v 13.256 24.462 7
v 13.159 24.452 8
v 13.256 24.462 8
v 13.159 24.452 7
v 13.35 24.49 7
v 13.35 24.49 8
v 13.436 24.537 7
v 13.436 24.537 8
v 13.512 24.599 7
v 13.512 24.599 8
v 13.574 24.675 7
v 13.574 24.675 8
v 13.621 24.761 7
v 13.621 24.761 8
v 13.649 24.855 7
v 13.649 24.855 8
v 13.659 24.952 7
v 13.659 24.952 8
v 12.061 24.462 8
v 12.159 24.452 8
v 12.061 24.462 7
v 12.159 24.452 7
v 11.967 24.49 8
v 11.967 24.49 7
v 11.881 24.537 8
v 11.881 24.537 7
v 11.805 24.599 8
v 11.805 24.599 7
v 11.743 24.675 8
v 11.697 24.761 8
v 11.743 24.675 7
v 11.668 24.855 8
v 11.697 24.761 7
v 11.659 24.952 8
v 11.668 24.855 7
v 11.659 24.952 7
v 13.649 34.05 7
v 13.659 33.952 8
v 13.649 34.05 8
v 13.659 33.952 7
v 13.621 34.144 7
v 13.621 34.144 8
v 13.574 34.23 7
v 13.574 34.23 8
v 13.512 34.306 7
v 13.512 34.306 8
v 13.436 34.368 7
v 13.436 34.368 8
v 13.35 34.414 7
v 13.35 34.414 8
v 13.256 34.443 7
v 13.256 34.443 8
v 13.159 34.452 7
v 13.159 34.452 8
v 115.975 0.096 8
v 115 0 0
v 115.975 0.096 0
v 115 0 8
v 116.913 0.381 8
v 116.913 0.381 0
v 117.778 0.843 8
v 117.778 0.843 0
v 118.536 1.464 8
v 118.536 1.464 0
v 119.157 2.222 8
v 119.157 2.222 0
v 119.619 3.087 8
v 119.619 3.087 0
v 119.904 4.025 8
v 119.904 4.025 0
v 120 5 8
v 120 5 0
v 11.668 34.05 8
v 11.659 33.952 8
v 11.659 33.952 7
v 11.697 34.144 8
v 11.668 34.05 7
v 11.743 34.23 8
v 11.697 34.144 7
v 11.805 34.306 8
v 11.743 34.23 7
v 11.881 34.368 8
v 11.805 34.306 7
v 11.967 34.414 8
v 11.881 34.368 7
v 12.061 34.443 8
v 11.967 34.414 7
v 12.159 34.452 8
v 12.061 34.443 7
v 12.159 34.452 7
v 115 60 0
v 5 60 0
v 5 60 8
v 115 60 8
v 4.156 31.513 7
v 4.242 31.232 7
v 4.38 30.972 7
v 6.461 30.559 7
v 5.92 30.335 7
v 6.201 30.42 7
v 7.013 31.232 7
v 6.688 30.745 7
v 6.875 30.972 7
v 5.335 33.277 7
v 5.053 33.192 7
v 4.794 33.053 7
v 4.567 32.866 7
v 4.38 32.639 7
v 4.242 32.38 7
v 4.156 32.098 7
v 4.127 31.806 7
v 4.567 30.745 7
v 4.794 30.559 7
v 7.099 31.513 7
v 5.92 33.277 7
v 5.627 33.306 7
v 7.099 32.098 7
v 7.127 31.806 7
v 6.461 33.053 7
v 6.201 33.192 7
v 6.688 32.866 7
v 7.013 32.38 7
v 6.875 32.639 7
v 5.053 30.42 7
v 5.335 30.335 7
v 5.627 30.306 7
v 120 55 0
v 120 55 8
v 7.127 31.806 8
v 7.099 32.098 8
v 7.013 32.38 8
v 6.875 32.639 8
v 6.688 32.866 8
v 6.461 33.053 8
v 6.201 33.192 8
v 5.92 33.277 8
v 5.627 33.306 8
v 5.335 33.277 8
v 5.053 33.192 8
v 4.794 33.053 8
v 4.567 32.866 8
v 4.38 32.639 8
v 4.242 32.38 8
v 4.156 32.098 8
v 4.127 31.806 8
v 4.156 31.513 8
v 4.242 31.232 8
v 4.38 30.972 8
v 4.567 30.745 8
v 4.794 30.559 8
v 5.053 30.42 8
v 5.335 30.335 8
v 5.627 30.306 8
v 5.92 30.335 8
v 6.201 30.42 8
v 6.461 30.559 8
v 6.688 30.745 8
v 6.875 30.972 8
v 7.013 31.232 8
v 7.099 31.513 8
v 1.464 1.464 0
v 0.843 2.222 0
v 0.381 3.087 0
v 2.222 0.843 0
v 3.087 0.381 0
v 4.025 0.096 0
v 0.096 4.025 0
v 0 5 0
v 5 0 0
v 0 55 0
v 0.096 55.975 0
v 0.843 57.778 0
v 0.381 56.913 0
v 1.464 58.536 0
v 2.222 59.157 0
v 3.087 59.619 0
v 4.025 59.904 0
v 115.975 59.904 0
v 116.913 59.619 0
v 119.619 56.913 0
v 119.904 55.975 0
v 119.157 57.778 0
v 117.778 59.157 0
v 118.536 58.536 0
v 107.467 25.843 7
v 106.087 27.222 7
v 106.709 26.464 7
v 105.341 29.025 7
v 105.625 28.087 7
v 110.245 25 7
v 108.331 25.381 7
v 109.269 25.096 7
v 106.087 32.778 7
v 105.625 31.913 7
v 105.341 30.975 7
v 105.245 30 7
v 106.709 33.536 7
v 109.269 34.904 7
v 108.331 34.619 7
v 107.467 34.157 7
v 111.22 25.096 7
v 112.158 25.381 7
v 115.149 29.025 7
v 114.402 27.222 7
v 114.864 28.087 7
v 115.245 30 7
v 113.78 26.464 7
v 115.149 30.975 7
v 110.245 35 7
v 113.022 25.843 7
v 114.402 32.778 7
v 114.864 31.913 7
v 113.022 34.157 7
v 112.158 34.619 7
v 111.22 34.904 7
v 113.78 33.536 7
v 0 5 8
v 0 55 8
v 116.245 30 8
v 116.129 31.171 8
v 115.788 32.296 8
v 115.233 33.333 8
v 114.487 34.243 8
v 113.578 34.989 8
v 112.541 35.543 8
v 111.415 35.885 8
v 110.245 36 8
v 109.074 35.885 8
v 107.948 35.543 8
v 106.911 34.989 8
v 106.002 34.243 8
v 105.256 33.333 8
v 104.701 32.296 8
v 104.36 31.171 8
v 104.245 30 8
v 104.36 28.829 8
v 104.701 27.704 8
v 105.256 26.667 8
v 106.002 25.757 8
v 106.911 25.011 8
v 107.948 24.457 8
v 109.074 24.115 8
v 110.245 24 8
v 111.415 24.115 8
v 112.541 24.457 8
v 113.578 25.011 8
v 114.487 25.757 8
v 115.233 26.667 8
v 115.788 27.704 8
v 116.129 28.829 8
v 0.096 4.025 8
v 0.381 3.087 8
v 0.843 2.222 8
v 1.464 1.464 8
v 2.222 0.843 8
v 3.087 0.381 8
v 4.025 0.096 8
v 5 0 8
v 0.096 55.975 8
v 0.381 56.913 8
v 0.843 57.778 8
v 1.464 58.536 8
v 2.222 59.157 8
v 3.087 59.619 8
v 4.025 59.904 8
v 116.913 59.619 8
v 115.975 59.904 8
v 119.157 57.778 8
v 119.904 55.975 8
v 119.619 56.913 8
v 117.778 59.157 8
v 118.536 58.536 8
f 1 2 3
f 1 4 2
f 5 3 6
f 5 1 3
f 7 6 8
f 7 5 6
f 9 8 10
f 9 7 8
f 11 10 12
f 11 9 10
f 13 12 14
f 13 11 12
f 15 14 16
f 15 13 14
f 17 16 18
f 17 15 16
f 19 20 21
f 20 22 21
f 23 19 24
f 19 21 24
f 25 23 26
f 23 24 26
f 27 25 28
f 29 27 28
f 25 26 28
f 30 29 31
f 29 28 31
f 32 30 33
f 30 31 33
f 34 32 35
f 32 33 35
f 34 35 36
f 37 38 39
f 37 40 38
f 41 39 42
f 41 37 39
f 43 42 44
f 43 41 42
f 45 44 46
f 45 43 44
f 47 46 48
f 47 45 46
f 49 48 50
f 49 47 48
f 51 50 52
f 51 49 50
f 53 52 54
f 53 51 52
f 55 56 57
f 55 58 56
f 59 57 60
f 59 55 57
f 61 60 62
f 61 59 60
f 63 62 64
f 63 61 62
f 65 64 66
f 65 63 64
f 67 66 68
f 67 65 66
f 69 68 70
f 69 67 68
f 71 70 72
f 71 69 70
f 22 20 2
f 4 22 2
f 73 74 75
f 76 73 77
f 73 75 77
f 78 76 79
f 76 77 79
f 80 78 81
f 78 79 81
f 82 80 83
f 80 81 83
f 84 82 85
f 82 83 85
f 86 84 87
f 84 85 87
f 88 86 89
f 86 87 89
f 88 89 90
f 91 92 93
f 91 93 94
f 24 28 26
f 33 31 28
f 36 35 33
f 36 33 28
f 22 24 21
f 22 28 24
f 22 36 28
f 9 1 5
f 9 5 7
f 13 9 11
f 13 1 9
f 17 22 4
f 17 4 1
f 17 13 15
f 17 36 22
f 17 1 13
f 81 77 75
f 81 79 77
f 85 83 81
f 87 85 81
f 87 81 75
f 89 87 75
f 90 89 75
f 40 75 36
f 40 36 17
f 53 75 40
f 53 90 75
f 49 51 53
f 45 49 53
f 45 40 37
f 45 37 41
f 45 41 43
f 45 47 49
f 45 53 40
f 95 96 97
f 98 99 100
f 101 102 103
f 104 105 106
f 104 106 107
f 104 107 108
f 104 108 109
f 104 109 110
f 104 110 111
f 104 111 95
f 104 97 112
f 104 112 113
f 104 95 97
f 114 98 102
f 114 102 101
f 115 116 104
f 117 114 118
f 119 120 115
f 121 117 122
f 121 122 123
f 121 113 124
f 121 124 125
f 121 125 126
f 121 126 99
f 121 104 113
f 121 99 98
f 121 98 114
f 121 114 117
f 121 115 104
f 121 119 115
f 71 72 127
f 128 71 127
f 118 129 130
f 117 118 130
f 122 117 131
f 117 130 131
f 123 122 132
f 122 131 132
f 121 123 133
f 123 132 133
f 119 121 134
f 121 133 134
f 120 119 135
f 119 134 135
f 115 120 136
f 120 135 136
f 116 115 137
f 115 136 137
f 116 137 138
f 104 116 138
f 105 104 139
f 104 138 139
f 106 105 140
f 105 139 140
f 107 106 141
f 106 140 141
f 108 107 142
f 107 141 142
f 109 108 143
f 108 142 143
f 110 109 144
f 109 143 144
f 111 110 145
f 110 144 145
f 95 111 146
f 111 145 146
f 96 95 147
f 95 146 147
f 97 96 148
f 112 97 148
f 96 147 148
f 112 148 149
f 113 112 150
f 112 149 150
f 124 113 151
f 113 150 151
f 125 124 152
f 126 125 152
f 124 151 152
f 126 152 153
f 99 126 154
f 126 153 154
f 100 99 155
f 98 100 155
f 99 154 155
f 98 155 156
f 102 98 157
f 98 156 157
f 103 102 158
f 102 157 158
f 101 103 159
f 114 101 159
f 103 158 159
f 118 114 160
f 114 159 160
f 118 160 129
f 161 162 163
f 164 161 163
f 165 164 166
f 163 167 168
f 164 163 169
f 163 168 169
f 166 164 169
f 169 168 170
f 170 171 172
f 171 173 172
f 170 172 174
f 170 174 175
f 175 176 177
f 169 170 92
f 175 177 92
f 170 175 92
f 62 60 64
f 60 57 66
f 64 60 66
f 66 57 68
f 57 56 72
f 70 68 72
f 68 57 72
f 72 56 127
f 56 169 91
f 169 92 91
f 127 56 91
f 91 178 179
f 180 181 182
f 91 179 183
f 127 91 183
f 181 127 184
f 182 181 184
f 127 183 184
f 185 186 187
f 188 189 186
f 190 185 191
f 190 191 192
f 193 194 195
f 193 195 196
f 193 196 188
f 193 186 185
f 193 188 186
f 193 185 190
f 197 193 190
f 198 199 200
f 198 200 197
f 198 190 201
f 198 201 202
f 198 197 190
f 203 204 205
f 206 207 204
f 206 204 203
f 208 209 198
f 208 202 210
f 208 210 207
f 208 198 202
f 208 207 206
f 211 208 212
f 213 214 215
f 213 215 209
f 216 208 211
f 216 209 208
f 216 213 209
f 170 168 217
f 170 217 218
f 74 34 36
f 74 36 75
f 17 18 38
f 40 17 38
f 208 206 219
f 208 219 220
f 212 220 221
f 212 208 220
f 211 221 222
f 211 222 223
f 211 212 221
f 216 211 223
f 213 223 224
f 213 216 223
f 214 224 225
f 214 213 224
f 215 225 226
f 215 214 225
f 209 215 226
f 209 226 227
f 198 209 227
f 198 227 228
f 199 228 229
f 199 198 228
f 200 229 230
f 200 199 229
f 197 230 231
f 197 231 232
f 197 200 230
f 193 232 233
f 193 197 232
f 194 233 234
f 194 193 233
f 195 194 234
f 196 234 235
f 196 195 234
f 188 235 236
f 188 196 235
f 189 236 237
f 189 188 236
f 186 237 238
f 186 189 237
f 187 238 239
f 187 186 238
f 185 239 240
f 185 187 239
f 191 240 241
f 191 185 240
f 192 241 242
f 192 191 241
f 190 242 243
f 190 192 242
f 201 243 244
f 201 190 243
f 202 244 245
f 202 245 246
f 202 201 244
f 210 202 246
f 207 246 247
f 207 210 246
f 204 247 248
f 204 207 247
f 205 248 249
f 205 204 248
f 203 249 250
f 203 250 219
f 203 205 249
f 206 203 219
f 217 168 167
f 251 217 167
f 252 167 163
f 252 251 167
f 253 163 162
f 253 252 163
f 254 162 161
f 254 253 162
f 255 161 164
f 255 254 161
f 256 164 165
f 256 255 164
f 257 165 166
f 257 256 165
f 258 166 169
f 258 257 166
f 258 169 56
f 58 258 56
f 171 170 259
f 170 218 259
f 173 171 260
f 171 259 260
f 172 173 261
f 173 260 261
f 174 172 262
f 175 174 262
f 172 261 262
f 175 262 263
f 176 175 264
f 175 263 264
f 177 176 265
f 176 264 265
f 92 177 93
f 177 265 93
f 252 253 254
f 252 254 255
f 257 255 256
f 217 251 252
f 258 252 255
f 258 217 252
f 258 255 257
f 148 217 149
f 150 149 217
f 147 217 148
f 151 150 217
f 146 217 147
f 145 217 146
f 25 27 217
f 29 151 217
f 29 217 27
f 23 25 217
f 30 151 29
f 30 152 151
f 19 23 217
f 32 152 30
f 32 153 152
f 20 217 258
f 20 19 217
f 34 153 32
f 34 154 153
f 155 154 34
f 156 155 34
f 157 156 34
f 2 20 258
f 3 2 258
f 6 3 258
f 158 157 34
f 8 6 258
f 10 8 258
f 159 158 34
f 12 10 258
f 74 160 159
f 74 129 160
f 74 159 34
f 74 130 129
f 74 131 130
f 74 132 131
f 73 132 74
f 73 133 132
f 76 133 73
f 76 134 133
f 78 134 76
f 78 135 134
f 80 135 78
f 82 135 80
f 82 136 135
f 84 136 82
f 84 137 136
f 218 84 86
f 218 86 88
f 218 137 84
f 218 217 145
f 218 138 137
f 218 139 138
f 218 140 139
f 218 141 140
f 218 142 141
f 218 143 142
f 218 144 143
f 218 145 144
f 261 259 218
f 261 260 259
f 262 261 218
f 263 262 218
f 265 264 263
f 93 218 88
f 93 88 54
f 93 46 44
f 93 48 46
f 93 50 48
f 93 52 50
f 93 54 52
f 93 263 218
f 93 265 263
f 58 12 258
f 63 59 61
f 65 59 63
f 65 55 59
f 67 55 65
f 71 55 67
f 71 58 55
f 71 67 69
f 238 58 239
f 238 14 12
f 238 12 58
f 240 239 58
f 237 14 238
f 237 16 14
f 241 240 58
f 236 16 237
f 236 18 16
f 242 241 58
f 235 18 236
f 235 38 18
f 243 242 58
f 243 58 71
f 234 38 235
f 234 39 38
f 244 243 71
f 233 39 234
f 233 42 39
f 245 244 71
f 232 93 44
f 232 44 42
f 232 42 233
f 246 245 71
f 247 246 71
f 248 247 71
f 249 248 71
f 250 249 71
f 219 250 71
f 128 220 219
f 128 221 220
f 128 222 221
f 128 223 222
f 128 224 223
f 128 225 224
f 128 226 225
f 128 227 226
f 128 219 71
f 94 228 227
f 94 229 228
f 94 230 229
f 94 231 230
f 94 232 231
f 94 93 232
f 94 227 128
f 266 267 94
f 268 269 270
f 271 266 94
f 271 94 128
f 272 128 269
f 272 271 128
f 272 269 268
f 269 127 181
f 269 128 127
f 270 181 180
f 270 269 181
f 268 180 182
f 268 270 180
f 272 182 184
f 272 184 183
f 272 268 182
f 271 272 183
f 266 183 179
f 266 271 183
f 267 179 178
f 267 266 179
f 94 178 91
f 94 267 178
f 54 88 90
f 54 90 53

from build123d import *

# Parameters (mm, degrees)
F0_W      = 120
F0_H      = 60
F1_DEPTH  = 8
F2_R      = 5
F3_R      = 5
F4_R      = 5
F5_R      = 5
F6_W      = 2
F6_H      = 10
F7_DEPTH  = 1
F8_R      = 0.5
F9_R      = 0.5
F10_R     = 1.5
F11_DEPTH = 1
F14_R     = 6
F15_DEPTH = 1
F16_SIZE  = 0.99999


# Not quite as in the source:
# - a fillet or chamfer is up to 0.001 mm smaller than in the source, because OpenCascade refuses the exact size


with BuildPart() as f1:
    # F0 (on Top) → F1 (new body)
    with BuildSketch(Plane.XY):
        with Locations((60, 30)):
            Rectangle(F0_W, F0_H)
    extrude(amount=F1_DEPTH)

    # F2
    f2_edges = [f1.edges().sort_by_distance(p)[0] for p in [
        (0, 60, 4),
    ]]
    fillet(f2_edges, radius=F2_R)

    # F3
    f3_edges = [f1.edges().sort_by_distance(p)[0] for p in [
        (0, 0, 4),
    ]]
    fillet(f3_edges, radius=F3_R)

    # F4
    f4_edges = [f1.edges().sort_by_distance(p)[0] for p in [
        (120, 0, 4),
    ]]
    fillet(f4_edges, radius=F4_R)

    # F5
    f5_edges = [f1.edges().sort_by_distance(p)[0] for p in [
        (120, 60, 4),
    ]]
    fillet(f5_edges, radius=F5_R)

    # F6 (on face) → F7 (cut)
    with BuildSketch(Plane.XY.offset(8)):
        with Locations((12.6586212461, 29.4524356723)):
            Rectangle(F6_W, F6_H)
    extrude(amount=-F7_DEPTH, mode=Mode.SUBTRACT)

    # F8
    f8_edges = [f1.edges().sort_by_distance(p)[0] for p in [
        (11.658621, 24.452436, 7.5),
        (13.658621, 24.452436, 7.5),
    ]]
    fillet(f8_edges, radius=F8_R)

    # F9
    f9_edges = [f1.edges().sort_by_distance(p)[0] for p in [
        (13.658621, 34.452436, 7.5),
        (11.658621, 34.452436, 7.5),
    ]]
    fillet(f9_edges, radius=F9_R)

    # F10 (on face) → F11 (cut)
    with BuildSketch(Plane.XY.offset(8)):
        with Locations((5.6273336522, 31.8058170378)):
            Circle(F10_R)
    extrude(amount=-F11_DEPTH, mode=Mode.SUBTRACT)

    # F14 (on face) → F15 (cut)
    with BuildSketch(Plane.XY.offset(8)):
        with Locations((110.2445796132, 30)):
            Circle(F14_R)
    extrude(amount=-F15_DEPTH, mode=Mode.SUBTRACT)

    # F16 (size 1 in the source; OpenCascade refuses exactly that, so slightly less here)
    f16_edges = [f1.edges().sort_by_distance(p)[0] for p in [
        (104.24458, 30, 7),
    ]]
    chamfer(f16_edges, length=F16_SIZE)


solid = f1.part
